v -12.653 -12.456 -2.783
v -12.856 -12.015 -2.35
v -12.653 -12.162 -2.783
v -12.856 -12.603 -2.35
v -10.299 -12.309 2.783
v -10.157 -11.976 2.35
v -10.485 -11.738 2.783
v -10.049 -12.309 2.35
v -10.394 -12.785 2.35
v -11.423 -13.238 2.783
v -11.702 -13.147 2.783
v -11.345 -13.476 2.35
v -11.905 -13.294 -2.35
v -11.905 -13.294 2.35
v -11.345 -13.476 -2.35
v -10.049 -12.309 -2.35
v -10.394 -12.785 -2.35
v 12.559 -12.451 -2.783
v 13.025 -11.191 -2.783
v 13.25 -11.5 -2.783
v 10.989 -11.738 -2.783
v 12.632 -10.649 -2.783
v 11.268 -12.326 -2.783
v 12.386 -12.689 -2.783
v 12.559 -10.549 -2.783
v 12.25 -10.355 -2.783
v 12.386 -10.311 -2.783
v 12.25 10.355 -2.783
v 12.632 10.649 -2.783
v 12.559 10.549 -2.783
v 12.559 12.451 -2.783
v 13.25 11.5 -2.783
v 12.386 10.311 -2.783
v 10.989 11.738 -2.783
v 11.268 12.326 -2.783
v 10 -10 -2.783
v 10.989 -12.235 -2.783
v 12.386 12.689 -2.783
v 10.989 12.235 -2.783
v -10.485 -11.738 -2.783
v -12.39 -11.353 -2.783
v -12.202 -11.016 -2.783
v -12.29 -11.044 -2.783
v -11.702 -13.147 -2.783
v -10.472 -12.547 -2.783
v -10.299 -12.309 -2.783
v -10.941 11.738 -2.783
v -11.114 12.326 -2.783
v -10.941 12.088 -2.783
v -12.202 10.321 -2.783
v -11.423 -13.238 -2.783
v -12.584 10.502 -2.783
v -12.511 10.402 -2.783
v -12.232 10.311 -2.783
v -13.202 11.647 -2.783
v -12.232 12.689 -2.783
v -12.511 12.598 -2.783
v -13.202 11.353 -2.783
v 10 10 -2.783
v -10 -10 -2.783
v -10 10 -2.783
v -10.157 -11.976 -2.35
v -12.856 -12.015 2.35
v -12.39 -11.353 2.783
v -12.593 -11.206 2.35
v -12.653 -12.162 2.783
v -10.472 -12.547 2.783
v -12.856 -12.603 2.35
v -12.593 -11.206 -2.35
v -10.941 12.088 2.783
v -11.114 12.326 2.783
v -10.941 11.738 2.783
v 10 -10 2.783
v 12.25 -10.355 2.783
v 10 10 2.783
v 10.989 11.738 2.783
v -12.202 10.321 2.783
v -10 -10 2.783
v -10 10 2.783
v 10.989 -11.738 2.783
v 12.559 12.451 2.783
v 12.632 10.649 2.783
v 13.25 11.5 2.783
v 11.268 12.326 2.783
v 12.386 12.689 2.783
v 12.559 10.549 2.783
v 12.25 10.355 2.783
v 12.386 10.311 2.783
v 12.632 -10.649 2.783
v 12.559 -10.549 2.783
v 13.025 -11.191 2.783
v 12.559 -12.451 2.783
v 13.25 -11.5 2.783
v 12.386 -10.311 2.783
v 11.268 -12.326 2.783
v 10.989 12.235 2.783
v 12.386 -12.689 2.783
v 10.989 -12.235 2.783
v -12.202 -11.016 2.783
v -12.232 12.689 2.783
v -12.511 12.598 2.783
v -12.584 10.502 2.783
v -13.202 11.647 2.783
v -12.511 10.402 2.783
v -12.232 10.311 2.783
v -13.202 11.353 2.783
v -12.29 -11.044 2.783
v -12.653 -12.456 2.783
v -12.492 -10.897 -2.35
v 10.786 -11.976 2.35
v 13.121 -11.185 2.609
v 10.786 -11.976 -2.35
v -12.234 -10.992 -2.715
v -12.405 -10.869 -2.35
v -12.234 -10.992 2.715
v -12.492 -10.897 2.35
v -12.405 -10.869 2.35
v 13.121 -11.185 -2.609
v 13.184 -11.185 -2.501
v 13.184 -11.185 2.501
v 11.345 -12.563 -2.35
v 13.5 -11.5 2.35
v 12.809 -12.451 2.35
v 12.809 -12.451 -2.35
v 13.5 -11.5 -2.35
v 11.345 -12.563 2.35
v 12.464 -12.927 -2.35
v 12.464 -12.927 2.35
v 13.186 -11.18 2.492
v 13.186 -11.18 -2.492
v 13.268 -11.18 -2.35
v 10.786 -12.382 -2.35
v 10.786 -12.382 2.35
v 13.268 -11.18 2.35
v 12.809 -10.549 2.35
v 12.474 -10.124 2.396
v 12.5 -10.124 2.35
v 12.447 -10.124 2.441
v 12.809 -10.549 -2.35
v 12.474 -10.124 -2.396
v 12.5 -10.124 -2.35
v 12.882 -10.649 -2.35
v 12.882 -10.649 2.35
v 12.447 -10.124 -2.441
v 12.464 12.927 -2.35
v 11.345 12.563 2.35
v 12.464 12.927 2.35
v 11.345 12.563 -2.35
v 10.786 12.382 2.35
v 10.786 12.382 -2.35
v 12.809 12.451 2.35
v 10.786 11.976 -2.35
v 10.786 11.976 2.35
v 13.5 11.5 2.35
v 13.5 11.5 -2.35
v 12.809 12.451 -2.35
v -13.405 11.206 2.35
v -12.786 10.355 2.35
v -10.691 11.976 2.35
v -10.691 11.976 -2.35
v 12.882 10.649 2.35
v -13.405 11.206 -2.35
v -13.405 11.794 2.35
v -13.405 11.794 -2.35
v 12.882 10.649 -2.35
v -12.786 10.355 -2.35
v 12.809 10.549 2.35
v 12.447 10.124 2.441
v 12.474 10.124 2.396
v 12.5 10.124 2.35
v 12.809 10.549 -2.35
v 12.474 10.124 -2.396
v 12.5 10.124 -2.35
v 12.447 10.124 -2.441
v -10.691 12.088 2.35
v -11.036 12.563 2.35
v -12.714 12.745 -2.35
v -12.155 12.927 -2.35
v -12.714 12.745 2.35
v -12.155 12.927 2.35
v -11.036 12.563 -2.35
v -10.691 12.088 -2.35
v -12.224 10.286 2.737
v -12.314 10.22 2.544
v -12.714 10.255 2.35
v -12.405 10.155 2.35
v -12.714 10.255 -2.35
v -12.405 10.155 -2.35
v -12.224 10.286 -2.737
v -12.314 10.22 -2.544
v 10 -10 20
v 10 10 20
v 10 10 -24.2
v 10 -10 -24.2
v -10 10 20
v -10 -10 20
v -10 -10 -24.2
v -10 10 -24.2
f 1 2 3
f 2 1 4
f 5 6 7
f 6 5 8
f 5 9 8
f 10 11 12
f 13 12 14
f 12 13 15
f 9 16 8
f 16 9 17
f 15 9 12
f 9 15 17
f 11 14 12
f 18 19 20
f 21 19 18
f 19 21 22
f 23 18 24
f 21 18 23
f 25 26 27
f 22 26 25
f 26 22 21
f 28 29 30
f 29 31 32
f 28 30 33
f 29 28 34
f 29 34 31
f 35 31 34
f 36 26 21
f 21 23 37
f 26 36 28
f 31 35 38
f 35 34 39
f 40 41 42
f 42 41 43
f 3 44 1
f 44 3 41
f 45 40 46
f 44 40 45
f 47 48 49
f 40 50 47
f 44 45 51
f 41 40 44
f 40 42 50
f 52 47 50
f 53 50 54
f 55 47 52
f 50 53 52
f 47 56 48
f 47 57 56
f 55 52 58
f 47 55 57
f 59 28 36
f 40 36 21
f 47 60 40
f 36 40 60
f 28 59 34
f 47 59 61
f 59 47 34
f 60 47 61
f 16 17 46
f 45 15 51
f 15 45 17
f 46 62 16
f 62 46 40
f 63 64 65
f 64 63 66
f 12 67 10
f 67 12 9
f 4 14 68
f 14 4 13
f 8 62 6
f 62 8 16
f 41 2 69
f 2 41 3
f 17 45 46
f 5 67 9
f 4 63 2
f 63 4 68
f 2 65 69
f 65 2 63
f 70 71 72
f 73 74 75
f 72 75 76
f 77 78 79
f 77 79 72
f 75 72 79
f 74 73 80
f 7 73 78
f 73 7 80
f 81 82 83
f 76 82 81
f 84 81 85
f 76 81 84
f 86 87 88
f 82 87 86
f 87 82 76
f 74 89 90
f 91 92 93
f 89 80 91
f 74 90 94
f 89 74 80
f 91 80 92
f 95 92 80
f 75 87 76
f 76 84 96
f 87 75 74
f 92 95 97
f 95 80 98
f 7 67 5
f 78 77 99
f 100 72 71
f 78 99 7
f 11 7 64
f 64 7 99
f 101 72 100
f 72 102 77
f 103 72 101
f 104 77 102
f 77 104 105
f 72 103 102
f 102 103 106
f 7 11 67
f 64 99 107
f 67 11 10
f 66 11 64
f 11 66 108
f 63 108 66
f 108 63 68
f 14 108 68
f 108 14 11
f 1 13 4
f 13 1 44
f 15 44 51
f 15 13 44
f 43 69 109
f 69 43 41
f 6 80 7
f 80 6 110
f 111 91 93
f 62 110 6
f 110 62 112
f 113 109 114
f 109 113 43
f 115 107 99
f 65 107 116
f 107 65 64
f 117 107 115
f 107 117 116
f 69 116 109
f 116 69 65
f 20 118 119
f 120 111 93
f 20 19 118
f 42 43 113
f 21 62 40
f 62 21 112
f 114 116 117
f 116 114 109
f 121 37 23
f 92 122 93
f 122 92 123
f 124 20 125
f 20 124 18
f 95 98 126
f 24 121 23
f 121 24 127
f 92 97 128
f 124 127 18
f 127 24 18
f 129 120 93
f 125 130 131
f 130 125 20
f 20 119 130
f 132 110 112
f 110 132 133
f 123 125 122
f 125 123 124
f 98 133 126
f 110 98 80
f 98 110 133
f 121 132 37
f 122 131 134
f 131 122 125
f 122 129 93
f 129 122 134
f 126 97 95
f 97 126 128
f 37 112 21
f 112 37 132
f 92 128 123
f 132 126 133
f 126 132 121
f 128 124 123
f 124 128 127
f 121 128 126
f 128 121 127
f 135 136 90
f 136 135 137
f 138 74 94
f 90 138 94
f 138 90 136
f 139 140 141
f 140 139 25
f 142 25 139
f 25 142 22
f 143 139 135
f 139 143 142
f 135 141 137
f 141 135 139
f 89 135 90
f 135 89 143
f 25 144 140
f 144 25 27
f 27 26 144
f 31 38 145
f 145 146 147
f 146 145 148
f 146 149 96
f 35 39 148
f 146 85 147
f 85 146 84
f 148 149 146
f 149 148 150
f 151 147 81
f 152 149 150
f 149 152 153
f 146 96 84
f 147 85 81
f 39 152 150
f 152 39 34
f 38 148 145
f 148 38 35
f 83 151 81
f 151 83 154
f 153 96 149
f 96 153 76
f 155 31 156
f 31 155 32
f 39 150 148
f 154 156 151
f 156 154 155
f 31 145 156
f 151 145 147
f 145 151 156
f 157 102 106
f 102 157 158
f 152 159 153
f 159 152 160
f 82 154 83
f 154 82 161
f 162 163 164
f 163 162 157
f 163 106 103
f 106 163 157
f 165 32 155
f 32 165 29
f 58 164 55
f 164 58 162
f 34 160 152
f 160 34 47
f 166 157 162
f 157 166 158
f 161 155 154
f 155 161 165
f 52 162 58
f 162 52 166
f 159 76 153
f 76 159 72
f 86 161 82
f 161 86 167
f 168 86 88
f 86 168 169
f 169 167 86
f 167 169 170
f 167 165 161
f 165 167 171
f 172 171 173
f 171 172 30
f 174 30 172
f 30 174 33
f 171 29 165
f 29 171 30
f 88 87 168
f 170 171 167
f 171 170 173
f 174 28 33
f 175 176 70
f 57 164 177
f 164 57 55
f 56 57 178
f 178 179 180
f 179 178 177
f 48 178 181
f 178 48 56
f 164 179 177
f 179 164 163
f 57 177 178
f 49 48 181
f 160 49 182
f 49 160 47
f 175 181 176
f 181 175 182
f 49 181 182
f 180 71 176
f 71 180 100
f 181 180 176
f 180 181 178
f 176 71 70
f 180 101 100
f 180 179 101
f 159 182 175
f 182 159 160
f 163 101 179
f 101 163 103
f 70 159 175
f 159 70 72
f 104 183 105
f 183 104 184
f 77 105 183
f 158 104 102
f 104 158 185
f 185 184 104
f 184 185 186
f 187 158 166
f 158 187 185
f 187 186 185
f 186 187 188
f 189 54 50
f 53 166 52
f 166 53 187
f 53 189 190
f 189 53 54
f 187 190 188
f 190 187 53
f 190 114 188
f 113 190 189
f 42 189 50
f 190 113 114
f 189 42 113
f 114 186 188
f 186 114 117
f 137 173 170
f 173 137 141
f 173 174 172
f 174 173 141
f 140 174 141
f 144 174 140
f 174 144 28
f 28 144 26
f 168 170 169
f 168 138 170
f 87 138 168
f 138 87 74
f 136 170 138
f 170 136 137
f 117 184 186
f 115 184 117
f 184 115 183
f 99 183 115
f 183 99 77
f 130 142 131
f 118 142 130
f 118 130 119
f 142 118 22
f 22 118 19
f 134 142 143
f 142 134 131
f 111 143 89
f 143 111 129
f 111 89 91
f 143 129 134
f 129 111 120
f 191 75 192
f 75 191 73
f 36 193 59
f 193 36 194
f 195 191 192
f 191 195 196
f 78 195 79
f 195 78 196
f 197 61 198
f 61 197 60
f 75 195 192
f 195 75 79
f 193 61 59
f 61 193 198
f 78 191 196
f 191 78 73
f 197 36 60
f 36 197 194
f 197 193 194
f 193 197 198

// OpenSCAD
// Parameters
width_x_mm = 26; //[13:52:0.5]
depth_y_mm = 25; //[12.5:50:0.5]
thickness_z_mm = 4.7; //[2.35:9.4:0.1]
hole_count = 2; //[1:4:1]
hole_diameter_mm = 5; //[3:10:0.1]
corner_radius_mm = 1; //[0.5:3:0.1]
chamfer_mm = 0.5; //[0:1.5:0.1]
hole_edge_margin_x_mm = 6; //[3:12:0.5]
hole_edge_margin_y_mm = 6; //[3:12:0.5]
hole_spacing_x_mm = 14; //[8:28:0.5]
hole_position_y_mm = 0; //[-6:6:0.5]
hole_clearance_extra_mm = 0.2; //[0:0.6:0.05]
hole_cut_extra_z_mm = 1; //[0.5:3:0.1]
extrusion_size_mm = 20; //[10:40:1]
extrusion_length_mm = 40; //[20:120:1]
extrusion_gap_to_bracket_mm = 0.5; //[0.2:2:0.1]

// Extrusion - complete geometry
module extrusion() {
  color([0.75, 0.75, 0.77]) {
    cube([extrusion_size_mm, extrusion_size_mm, extrusion_length_mm], center=true);
  }
}

// Extrusion Corner Bracket Hole Positions - complete geometry
module extrusion_corner_bracket_hole_positions() {
  color("Silver") {
    translate([-hole_spacing_x_mm/2, hole_position_y_mm, 0])
      cylinder(r=(hole_diameter_mm + hole_clearance_extra_mm)/2, h=thickness_z_mm + 2*hole_cut_extra_z_mm, center=true);
    translate([hole_spacing_x_mm/2, hole_position_y_mm, 0])
      cylinder(r=(hole_diameter_mm + hole_clearance_extra_mm)/2, h=thickness_z_mm + 2*hole_cut_extra_z_mm, center=true);
  }
}

// Extrusion Inner Corner Bracket - complete geometry
module extrusion_inner_corner_bracket() {
  color("DimGray") {
    cube([extrusion_size_mm, extrusion_size_mm, thickness_z_mm], center=true);
  }
}

// Extrusion Corner Bracket Assembly - complete geometry
module extrusion_corner_bracket_assembly() {
  color("Silver") {
    difference() {
      union() {
        // Bracket body with rounded corners
        minkowski() {
          union() {
            cube([width_x_mm - 2*corner_radius_mm, depth_y_mm - 2*corner_radius_mm, thickness_z_mm], center=true);
            translate([width_x_mm/2 - corner_radius_mm, depth_y_mm/2 - corner_radius_mm, 0])
              cylinder(r=corner_radius_mm, h=thickness_z_mm, center=true);
            mirror([1, 0, 0])
              translate([width_x_mm/2 - corner_radius_mm, depth_y_mm/2 - corner_radius_mm, 0])
              cylinder(r=corner_radius_mm, h=thickness_z_mm, center=true);
            mirror([0, 1, 0])
              translate([width_x_mm/2 - corner_radius_mm, depth_y_mm/2 - corner_radius_mm, 0])
              cylinder(r=corner_radius_mm, h=thickness_z_mm, center=true);
            mirror([1, 1, 0])
              translate([width_x_mm/2 - corner_radius_mm, depth_y_mm/2 - corner_radius_mm, 0])
              cylinder(r=corner_radius_mm, h=thickness_z_mm, center=true);
          }
          sphere(r=chamfer_mm, center=true);
        }
      }
      // Mounting holes
      extrusion_corner_bracket_hole_positions();
    }
  }
}

// Extrusion Corner Bracket - complete geometry
module extrusion_corner_bracket() {
  extrusion_corner_bracket_assembly();
}

// Assembly
module assembly() {
  extrusion();
  translate([0, 0, -(thickness_z_mm/2 + extrusion_length_mm/2 - extrusion_gap_to_bracket_mm)])
    extrusion_inner_corner_bracket();
  translate([0, 0, 0])
    extrusion_corner_bracket();
}

assembly();
